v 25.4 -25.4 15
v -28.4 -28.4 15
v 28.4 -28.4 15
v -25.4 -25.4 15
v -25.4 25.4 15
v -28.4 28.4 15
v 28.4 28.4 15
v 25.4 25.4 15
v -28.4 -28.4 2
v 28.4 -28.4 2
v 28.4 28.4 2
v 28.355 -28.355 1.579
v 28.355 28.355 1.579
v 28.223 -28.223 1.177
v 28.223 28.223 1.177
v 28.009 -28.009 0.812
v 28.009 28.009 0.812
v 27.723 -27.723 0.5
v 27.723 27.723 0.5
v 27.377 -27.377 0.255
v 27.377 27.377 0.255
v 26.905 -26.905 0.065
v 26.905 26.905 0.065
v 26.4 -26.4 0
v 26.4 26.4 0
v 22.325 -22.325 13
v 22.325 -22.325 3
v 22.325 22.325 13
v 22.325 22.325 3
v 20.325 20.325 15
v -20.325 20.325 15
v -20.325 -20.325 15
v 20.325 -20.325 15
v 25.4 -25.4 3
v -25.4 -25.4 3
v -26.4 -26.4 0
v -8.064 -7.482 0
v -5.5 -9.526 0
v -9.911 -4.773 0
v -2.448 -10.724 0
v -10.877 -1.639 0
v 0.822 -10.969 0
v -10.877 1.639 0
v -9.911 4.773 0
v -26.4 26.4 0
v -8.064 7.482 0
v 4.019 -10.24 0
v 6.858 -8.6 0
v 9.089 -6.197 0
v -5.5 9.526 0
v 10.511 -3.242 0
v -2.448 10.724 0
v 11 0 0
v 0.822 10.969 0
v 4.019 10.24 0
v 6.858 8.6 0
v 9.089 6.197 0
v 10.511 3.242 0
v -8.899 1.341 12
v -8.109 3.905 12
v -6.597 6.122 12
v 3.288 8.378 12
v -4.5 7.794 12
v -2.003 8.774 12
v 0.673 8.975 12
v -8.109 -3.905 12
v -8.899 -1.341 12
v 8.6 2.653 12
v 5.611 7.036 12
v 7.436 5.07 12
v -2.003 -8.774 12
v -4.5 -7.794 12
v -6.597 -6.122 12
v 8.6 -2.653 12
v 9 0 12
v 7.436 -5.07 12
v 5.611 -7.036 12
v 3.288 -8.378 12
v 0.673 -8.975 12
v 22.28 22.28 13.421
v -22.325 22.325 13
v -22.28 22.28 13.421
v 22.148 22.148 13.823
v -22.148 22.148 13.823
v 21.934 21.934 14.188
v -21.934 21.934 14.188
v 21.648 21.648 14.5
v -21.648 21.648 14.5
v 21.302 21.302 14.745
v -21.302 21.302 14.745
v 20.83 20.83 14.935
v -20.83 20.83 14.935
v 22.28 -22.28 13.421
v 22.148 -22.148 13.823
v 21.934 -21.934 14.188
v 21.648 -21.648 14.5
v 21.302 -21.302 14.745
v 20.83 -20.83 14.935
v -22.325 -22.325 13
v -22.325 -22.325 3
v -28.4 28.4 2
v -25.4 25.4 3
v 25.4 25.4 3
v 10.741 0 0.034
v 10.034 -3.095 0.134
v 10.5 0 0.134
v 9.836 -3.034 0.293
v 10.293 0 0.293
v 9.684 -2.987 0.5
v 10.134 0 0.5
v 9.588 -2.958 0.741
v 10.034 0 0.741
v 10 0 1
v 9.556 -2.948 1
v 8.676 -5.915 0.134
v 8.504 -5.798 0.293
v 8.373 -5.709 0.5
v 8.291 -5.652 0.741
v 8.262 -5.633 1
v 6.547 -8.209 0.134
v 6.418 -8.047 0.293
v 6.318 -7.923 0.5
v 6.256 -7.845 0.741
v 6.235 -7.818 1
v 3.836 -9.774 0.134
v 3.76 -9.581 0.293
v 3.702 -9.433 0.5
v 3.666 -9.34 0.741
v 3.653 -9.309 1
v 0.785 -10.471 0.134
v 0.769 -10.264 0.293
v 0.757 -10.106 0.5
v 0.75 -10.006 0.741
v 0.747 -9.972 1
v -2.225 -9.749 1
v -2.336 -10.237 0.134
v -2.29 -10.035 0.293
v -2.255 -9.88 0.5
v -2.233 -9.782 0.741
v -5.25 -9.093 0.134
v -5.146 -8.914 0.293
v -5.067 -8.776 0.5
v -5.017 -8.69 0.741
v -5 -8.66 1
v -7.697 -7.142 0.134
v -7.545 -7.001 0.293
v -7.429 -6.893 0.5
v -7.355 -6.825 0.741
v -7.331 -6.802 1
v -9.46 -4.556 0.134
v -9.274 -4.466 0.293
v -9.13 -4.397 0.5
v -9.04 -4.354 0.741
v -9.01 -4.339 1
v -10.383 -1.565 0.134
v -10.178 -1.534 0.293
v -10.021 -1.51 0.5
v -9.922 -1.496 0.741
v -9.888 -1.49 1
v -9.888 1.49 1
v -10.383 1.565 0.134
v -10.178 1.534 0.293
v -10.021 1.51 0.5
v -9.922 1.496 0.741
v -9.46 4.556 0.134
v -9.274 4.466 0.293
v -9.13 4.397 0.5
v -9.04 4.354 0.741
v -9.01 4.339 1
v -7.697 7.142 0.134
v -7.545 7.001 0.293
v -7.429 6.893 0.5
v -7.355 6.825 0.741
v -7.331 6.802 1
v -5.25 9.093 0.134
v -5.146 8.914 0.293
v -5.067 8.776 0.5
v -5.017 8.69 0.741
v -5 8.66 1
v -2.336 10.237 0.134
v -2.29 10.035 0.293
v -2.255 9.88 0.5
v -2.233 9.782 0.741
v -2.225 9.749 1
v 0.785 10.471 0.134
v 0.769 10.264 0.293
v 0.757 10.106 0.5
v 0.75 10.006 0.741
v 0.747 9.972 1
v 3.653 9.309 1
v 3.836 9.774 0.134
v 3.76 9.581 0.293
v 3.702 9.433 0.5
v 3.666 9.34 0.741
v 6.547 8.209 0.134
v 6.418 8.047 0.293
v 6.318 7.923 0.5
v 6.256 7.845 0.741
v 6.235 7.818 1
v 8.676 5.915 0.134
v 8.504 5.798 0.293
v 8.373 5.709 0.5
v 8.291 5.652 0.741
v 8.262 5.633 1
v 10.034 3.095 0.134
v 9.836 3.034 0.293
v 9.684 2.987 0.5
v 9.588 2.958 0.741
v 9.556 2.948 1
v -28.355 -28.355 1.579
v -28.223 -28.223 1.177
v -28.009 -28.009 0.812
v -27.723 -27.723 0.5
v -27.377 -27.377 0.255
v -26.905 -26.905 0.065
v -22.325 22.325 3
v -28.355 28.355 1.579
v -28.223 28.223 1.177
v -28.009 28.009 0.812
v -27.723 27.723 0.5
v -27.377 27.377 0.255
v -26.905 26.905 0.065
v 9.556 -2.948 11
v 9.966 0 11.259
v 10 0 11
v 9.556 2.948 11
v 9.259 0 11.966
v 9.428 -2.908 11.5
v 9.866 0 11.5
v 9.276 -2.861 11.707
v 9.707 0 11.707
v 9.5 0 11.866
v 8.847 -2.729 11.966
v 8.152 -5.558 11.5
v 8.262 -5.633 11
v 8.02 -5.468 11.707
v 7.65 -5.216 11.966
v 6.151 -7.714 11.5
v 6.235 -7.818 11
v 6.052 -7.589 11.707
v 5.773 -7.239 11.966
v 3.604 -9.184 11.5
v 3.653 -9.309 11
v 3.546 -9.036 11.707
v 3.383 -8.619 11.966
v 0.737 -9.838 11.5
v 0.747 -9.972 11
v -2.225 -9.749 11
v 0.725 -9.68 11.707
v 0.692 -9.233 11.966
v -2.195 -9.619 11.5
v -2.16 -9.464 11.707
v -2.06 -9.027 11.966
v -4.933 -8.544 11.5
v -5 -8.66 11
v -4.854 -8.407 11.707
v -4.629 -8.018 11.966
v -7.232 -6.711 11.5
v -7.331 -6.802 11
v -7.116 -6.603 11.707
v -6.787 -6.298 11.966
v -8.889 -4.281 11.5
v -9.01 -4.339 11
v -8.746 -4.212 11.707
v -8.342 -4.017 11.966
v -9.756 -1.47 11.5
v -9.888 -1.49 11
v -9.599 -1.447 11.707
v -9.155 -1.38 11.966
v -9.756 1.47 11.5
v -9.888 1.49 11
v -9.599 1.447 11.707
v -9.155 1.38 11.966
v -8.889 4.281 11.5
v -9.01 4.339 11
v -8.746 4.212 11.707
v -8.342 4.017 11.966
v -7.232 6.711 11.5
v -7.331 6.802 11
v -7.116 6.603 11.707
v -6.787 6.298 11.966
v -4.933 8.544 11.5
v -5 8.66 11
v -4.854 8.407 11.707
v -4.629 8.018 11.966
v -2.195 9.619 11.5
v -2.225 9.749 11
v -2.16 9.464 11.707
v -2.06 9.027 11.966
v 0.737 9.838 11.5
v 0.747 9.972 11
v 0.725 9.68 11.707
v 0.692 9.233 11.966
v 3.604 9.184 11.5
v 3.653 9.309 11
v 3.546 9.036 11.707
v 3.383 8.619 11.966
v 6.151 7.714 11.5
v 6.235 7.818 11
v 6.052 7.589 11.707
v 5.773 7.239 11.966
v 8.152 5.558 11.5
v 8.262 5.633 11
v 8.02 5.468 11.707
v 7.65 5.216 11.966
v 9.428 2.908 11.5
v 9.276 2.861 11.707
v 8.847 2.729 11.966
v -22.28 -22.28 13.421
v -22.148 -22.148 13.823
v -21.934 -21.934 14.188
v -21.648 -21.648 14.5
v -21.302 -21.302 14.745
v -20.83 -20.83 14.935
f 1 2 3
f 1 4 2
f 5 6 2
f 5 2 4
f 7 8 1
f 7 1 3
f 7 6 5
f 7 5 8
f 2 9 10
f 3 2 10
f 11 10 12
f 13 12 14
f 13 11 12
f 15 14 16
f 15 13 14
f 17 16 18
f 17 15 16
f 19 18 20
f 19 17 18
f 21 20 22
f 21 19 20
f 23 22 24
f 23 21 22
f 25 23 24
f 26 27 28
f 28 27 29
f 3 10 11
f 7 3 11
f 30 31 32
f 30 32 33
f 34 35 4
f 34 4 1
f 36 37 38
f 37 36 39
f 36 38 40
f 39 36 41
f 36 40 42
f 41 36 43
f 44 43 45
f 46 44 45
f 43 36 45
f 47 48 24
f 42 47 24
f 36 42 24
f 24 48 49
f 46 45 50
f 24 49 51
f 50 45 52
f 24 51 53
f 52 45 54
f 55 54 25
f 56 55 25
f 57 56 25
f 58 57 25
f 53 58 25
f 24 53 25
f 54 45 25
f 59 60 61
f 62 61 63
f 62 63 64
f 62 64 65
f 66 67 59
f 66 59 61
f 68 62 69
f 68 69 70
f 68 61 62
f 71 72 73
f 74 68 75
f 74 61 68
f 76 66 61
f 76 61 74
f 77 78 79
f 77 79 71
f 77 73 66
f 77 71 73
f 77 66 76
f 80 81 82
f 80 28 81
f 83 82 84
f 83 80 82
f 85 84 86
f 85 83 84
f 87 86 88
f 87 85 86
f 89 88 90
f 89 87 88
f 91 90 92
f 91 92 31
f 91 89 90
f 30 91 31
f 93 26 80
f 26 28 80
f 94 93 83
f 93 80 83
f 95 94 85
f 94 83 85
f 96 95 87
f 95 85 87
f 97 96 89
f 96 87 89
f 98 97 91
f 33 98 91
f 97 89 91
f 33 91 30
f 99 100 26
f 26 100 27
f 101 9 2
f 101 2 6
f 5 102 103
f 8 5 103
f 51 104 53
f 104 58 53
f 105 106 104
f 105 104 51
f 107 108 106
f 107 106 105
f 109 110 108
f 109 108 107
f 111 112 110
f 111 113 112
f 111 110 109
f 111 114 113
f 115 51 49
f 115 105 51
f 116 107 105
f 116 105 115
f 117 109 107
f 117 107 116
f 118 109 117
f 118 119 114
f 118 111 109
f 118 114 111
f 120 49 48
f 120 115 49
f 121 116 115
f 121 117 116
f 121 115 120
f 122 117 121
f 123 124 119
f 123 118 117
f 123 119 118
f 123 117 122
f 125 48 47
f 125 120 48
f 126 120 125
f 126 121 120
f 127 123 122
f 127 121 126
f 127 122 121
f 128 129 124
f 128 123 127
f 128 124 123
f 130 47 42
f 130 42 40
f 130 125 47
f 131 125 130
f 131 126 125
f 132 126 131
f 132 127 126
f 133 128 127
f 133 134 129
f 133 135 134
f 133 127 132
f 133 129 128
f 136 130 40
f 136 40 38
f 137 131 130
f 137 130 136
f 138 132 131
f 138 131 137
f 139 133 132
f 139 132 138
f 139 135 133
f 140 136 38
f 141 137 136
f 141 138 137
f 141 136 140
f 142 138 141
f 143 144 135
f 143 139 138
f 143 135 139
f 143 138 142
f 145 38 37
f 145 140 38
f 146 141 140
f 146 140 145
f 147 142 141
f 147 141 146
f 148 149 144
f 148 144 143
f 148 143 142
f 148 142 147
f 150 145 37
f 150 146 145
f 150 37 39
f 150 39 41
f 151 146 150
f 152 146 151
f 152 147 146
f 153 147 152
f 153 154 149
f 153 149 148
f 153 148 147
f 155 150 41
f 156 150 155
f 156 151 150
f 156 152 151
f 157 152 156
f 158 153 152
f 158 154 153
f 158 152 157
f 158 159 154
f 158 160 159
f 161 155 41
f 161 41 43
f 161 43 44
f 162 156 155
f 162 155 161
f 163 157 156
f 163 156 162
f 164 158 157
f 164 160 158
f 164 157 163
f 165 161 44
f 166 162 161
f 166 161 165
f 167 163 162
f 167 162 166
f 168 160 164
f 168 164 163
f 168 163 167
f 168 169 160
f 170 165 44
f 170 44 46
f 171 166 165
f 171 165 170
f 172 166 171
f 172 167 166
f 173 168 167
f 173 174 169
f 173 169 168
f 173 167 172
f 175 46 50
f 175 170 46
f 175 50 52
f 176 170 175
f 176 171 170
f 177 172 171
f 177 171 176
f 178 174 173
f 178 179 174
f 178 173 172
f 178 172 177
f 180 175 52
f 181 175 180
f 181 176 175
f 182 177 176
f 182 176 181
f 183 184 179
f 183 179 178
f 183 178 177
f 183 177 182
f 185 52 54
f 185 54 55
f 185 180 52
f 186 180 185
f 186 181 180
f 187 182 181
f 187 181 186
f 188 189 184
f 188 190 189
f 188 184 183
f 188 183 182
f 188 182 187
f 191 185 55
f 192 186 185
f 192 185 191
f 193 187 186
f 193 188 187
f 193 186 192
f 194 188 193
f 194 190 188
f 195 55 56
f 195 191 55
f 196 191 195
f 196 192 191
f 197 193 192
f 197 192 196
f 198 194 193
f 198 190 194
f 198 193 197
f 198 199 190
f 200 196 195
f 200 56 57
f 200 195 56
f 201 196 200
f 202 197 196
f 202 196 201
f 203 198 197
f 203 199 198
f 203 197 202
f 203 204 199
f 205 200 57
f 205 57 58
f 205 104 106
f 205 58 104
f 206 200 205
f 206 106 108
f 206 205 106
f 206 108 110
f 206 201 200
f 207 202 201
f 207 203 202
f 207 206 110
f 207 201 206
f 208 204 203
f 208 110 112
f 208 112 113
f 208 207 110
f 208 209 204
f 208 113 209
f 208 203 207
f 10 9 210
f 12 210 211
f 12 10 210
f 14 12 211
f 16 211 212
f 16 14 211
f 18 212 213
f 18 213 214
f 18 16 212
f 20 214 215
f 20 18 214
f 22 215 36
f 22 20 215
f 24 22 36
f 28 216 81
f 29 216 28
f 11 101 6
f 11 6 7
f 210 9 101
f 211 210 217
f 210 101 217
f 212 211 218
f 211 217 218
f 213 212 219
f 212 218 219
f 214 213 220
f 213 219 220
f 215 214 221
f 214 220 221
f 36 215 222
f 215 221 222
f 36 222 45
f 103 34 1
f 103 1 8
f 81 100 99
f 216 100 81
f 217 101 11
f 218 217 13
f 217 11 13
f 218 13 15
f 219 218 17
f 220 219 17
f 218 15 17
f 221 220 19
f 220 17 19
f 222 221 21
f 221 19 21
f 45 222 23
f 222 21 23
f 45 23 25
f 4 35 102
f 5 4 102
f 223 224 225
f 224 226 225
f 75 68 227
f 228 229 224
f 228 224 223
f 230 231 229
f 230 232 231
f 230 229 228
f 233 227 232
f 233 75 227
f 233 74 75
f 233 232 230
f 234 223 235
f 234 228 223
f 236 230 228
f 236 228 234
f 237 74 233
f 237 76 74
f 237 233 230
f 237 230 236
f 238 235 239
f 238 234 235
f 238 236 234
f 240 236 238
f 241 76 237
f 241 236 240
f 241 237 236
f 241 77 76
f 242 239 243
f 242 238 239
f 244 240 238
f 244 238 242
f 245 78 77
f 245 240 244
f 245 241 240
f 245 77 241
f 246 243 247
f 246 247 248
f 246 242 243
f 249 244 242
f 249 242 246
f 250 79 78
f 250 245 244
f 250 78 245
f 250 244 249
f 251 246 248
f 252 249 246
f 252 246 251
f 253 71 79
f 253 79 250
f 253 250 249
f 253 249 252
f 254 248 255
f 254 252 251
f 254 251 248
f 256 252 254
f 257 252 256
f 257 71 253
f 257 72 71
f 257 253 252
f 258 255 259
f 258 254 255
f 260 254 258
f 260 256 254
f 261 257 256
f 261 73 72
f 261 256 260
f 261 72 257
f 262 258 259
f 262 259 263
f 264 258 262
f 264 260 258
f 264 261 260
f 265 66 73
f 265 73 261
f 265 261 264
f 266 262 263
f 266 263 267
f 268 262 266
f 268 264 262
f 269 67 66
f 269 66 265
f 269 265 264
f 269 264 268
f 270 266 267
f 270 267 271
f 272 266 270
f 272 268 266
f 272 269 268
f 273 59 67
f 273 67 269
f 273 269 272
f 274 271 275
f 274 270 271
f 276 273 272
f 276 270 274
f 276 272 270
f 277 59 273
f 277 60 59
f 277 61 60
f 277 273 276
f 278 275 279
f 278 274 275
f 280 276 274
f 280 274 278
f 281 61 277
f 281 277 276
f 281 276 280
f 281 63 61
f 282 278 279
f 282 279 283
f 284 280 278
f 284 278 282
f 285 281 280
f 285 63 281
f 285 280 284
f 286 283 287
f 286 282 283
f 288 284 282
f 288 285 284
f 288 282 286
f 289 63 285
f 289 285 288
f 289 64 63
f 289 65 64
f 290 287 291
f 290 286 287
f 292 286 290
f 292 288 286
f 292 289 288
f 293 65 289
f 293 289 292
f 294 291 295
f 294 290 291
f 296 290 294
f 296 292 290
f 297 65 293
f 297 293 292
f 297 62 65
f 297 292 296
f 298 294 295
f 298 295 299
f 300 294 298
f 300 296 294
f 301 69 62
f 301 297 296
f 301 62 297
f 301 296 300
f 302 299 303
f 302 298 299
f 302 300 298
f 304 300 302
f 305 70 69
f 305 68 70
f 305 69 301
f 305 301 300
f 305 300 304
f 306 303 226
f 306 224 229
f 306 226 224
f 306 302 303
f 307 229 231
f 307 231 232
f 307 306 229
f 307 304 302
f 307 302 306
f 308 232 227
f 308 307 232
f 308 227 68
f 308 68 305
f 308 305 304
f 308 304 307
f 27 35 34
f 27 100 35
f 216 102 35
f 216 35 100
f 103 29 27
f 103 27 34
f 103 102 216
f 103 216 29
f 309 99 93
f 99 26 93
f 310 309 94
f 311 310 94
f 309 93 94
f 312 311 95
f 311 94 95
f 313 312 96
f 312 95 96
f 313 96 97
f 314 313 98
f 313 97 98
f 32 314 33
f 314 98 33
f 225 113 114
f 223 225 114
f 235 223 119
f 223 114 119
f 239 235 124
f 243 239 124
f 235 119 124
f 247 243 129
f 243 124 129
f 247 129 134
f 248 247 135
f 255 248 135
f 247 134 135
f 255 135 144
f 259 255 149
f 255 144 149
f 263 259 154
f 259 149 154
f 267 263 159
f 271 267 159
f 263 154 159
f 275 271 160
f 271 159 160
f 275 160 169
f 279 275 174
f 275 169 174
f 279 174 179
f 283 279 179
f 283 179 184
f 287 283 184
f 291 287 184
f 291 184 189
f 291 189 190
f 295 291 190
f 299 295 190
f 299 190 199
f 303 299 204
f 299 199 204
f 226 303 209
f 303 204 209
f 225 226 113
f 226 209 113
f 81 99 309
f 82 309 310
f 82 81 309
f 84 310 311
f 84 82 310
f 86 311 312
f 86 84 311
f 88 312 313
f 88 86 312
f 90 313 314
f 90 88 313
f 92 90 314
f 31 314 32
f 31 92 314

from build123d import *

# Parameters (mm, degrees)
F0_W     = 50.8
F0_H     = 50.8
F0_W_2   = 44.65
F0_H_2   = 44.65
F1_DEPTH = 3
F0_W_3   = 56.8
F0_H_3   = 56.8
F2_DEPTH = 15
F3_R     = 2
F4_R     = 2
F5_R     = 10
F6_DEPTH = 12
F7_R     = 1


with BuildPart() as f1:
    # F0 (on Top) → F1 (new body)
    with BuildSketch(Plane.XY):
        Rectangle(F0_W, F0_H)
        Rectangle(F0_W_2, F0_H_2, mode=Mode.SUBTRACT)
    extrude(amount=F1_DEPTH)

    # F0 (on Top) → F2 (join)
    with BuildSketch(Plane.XY):
        Rectangle(F0_W_3, F0_H_3)
        Rectangle(F0_W, F0_H, mode=Mode.SUBTRACT)
        Rectangle(F0_W_2, F0_H_2)
    extrude(amount=F2_DEPTH)

    # F3
    f3_edges = [f1.edges().sort_by_distance(p)[0] for p in [
        (22.325, 0, 15),
        (0, 22.325, 15),
        (-22.325, 0, 15),
        (0, -22.325, 15),
    ]]
    fillet(f3_edges, radius=F3_R)

    # F4
    f4_edges = [f1.edges().sort_by_distance(p)[0] for p in [
        (28.4, 0, 0),
        (0, 28.4, 0),
        (-28.4, 0, 0),
        (0, -28.4, 0),
    ]]
    fillet(f4_edges, radius=F4_R)

    # F5 (on face) → F6 (cut)
    with BuildSketch(Plane(origin=(0, 0, 0), x_dir=(1, 0, 0), z_dir=(0, 0, -1))):
        Circle(F5_R)
    extrude(amount=-F6_DEPTH, mode=Mode.SUBTRACT)

    # F7
    f7_edges = [f1.edges().sort_by_distance(p)[0] for p in [
        (10, 0, 6),
        (-10, 0, 0),
        (-10, 0, 12),
    ]]
    fillet(f7_edges, radius=F7_R)


solid = f1.part
